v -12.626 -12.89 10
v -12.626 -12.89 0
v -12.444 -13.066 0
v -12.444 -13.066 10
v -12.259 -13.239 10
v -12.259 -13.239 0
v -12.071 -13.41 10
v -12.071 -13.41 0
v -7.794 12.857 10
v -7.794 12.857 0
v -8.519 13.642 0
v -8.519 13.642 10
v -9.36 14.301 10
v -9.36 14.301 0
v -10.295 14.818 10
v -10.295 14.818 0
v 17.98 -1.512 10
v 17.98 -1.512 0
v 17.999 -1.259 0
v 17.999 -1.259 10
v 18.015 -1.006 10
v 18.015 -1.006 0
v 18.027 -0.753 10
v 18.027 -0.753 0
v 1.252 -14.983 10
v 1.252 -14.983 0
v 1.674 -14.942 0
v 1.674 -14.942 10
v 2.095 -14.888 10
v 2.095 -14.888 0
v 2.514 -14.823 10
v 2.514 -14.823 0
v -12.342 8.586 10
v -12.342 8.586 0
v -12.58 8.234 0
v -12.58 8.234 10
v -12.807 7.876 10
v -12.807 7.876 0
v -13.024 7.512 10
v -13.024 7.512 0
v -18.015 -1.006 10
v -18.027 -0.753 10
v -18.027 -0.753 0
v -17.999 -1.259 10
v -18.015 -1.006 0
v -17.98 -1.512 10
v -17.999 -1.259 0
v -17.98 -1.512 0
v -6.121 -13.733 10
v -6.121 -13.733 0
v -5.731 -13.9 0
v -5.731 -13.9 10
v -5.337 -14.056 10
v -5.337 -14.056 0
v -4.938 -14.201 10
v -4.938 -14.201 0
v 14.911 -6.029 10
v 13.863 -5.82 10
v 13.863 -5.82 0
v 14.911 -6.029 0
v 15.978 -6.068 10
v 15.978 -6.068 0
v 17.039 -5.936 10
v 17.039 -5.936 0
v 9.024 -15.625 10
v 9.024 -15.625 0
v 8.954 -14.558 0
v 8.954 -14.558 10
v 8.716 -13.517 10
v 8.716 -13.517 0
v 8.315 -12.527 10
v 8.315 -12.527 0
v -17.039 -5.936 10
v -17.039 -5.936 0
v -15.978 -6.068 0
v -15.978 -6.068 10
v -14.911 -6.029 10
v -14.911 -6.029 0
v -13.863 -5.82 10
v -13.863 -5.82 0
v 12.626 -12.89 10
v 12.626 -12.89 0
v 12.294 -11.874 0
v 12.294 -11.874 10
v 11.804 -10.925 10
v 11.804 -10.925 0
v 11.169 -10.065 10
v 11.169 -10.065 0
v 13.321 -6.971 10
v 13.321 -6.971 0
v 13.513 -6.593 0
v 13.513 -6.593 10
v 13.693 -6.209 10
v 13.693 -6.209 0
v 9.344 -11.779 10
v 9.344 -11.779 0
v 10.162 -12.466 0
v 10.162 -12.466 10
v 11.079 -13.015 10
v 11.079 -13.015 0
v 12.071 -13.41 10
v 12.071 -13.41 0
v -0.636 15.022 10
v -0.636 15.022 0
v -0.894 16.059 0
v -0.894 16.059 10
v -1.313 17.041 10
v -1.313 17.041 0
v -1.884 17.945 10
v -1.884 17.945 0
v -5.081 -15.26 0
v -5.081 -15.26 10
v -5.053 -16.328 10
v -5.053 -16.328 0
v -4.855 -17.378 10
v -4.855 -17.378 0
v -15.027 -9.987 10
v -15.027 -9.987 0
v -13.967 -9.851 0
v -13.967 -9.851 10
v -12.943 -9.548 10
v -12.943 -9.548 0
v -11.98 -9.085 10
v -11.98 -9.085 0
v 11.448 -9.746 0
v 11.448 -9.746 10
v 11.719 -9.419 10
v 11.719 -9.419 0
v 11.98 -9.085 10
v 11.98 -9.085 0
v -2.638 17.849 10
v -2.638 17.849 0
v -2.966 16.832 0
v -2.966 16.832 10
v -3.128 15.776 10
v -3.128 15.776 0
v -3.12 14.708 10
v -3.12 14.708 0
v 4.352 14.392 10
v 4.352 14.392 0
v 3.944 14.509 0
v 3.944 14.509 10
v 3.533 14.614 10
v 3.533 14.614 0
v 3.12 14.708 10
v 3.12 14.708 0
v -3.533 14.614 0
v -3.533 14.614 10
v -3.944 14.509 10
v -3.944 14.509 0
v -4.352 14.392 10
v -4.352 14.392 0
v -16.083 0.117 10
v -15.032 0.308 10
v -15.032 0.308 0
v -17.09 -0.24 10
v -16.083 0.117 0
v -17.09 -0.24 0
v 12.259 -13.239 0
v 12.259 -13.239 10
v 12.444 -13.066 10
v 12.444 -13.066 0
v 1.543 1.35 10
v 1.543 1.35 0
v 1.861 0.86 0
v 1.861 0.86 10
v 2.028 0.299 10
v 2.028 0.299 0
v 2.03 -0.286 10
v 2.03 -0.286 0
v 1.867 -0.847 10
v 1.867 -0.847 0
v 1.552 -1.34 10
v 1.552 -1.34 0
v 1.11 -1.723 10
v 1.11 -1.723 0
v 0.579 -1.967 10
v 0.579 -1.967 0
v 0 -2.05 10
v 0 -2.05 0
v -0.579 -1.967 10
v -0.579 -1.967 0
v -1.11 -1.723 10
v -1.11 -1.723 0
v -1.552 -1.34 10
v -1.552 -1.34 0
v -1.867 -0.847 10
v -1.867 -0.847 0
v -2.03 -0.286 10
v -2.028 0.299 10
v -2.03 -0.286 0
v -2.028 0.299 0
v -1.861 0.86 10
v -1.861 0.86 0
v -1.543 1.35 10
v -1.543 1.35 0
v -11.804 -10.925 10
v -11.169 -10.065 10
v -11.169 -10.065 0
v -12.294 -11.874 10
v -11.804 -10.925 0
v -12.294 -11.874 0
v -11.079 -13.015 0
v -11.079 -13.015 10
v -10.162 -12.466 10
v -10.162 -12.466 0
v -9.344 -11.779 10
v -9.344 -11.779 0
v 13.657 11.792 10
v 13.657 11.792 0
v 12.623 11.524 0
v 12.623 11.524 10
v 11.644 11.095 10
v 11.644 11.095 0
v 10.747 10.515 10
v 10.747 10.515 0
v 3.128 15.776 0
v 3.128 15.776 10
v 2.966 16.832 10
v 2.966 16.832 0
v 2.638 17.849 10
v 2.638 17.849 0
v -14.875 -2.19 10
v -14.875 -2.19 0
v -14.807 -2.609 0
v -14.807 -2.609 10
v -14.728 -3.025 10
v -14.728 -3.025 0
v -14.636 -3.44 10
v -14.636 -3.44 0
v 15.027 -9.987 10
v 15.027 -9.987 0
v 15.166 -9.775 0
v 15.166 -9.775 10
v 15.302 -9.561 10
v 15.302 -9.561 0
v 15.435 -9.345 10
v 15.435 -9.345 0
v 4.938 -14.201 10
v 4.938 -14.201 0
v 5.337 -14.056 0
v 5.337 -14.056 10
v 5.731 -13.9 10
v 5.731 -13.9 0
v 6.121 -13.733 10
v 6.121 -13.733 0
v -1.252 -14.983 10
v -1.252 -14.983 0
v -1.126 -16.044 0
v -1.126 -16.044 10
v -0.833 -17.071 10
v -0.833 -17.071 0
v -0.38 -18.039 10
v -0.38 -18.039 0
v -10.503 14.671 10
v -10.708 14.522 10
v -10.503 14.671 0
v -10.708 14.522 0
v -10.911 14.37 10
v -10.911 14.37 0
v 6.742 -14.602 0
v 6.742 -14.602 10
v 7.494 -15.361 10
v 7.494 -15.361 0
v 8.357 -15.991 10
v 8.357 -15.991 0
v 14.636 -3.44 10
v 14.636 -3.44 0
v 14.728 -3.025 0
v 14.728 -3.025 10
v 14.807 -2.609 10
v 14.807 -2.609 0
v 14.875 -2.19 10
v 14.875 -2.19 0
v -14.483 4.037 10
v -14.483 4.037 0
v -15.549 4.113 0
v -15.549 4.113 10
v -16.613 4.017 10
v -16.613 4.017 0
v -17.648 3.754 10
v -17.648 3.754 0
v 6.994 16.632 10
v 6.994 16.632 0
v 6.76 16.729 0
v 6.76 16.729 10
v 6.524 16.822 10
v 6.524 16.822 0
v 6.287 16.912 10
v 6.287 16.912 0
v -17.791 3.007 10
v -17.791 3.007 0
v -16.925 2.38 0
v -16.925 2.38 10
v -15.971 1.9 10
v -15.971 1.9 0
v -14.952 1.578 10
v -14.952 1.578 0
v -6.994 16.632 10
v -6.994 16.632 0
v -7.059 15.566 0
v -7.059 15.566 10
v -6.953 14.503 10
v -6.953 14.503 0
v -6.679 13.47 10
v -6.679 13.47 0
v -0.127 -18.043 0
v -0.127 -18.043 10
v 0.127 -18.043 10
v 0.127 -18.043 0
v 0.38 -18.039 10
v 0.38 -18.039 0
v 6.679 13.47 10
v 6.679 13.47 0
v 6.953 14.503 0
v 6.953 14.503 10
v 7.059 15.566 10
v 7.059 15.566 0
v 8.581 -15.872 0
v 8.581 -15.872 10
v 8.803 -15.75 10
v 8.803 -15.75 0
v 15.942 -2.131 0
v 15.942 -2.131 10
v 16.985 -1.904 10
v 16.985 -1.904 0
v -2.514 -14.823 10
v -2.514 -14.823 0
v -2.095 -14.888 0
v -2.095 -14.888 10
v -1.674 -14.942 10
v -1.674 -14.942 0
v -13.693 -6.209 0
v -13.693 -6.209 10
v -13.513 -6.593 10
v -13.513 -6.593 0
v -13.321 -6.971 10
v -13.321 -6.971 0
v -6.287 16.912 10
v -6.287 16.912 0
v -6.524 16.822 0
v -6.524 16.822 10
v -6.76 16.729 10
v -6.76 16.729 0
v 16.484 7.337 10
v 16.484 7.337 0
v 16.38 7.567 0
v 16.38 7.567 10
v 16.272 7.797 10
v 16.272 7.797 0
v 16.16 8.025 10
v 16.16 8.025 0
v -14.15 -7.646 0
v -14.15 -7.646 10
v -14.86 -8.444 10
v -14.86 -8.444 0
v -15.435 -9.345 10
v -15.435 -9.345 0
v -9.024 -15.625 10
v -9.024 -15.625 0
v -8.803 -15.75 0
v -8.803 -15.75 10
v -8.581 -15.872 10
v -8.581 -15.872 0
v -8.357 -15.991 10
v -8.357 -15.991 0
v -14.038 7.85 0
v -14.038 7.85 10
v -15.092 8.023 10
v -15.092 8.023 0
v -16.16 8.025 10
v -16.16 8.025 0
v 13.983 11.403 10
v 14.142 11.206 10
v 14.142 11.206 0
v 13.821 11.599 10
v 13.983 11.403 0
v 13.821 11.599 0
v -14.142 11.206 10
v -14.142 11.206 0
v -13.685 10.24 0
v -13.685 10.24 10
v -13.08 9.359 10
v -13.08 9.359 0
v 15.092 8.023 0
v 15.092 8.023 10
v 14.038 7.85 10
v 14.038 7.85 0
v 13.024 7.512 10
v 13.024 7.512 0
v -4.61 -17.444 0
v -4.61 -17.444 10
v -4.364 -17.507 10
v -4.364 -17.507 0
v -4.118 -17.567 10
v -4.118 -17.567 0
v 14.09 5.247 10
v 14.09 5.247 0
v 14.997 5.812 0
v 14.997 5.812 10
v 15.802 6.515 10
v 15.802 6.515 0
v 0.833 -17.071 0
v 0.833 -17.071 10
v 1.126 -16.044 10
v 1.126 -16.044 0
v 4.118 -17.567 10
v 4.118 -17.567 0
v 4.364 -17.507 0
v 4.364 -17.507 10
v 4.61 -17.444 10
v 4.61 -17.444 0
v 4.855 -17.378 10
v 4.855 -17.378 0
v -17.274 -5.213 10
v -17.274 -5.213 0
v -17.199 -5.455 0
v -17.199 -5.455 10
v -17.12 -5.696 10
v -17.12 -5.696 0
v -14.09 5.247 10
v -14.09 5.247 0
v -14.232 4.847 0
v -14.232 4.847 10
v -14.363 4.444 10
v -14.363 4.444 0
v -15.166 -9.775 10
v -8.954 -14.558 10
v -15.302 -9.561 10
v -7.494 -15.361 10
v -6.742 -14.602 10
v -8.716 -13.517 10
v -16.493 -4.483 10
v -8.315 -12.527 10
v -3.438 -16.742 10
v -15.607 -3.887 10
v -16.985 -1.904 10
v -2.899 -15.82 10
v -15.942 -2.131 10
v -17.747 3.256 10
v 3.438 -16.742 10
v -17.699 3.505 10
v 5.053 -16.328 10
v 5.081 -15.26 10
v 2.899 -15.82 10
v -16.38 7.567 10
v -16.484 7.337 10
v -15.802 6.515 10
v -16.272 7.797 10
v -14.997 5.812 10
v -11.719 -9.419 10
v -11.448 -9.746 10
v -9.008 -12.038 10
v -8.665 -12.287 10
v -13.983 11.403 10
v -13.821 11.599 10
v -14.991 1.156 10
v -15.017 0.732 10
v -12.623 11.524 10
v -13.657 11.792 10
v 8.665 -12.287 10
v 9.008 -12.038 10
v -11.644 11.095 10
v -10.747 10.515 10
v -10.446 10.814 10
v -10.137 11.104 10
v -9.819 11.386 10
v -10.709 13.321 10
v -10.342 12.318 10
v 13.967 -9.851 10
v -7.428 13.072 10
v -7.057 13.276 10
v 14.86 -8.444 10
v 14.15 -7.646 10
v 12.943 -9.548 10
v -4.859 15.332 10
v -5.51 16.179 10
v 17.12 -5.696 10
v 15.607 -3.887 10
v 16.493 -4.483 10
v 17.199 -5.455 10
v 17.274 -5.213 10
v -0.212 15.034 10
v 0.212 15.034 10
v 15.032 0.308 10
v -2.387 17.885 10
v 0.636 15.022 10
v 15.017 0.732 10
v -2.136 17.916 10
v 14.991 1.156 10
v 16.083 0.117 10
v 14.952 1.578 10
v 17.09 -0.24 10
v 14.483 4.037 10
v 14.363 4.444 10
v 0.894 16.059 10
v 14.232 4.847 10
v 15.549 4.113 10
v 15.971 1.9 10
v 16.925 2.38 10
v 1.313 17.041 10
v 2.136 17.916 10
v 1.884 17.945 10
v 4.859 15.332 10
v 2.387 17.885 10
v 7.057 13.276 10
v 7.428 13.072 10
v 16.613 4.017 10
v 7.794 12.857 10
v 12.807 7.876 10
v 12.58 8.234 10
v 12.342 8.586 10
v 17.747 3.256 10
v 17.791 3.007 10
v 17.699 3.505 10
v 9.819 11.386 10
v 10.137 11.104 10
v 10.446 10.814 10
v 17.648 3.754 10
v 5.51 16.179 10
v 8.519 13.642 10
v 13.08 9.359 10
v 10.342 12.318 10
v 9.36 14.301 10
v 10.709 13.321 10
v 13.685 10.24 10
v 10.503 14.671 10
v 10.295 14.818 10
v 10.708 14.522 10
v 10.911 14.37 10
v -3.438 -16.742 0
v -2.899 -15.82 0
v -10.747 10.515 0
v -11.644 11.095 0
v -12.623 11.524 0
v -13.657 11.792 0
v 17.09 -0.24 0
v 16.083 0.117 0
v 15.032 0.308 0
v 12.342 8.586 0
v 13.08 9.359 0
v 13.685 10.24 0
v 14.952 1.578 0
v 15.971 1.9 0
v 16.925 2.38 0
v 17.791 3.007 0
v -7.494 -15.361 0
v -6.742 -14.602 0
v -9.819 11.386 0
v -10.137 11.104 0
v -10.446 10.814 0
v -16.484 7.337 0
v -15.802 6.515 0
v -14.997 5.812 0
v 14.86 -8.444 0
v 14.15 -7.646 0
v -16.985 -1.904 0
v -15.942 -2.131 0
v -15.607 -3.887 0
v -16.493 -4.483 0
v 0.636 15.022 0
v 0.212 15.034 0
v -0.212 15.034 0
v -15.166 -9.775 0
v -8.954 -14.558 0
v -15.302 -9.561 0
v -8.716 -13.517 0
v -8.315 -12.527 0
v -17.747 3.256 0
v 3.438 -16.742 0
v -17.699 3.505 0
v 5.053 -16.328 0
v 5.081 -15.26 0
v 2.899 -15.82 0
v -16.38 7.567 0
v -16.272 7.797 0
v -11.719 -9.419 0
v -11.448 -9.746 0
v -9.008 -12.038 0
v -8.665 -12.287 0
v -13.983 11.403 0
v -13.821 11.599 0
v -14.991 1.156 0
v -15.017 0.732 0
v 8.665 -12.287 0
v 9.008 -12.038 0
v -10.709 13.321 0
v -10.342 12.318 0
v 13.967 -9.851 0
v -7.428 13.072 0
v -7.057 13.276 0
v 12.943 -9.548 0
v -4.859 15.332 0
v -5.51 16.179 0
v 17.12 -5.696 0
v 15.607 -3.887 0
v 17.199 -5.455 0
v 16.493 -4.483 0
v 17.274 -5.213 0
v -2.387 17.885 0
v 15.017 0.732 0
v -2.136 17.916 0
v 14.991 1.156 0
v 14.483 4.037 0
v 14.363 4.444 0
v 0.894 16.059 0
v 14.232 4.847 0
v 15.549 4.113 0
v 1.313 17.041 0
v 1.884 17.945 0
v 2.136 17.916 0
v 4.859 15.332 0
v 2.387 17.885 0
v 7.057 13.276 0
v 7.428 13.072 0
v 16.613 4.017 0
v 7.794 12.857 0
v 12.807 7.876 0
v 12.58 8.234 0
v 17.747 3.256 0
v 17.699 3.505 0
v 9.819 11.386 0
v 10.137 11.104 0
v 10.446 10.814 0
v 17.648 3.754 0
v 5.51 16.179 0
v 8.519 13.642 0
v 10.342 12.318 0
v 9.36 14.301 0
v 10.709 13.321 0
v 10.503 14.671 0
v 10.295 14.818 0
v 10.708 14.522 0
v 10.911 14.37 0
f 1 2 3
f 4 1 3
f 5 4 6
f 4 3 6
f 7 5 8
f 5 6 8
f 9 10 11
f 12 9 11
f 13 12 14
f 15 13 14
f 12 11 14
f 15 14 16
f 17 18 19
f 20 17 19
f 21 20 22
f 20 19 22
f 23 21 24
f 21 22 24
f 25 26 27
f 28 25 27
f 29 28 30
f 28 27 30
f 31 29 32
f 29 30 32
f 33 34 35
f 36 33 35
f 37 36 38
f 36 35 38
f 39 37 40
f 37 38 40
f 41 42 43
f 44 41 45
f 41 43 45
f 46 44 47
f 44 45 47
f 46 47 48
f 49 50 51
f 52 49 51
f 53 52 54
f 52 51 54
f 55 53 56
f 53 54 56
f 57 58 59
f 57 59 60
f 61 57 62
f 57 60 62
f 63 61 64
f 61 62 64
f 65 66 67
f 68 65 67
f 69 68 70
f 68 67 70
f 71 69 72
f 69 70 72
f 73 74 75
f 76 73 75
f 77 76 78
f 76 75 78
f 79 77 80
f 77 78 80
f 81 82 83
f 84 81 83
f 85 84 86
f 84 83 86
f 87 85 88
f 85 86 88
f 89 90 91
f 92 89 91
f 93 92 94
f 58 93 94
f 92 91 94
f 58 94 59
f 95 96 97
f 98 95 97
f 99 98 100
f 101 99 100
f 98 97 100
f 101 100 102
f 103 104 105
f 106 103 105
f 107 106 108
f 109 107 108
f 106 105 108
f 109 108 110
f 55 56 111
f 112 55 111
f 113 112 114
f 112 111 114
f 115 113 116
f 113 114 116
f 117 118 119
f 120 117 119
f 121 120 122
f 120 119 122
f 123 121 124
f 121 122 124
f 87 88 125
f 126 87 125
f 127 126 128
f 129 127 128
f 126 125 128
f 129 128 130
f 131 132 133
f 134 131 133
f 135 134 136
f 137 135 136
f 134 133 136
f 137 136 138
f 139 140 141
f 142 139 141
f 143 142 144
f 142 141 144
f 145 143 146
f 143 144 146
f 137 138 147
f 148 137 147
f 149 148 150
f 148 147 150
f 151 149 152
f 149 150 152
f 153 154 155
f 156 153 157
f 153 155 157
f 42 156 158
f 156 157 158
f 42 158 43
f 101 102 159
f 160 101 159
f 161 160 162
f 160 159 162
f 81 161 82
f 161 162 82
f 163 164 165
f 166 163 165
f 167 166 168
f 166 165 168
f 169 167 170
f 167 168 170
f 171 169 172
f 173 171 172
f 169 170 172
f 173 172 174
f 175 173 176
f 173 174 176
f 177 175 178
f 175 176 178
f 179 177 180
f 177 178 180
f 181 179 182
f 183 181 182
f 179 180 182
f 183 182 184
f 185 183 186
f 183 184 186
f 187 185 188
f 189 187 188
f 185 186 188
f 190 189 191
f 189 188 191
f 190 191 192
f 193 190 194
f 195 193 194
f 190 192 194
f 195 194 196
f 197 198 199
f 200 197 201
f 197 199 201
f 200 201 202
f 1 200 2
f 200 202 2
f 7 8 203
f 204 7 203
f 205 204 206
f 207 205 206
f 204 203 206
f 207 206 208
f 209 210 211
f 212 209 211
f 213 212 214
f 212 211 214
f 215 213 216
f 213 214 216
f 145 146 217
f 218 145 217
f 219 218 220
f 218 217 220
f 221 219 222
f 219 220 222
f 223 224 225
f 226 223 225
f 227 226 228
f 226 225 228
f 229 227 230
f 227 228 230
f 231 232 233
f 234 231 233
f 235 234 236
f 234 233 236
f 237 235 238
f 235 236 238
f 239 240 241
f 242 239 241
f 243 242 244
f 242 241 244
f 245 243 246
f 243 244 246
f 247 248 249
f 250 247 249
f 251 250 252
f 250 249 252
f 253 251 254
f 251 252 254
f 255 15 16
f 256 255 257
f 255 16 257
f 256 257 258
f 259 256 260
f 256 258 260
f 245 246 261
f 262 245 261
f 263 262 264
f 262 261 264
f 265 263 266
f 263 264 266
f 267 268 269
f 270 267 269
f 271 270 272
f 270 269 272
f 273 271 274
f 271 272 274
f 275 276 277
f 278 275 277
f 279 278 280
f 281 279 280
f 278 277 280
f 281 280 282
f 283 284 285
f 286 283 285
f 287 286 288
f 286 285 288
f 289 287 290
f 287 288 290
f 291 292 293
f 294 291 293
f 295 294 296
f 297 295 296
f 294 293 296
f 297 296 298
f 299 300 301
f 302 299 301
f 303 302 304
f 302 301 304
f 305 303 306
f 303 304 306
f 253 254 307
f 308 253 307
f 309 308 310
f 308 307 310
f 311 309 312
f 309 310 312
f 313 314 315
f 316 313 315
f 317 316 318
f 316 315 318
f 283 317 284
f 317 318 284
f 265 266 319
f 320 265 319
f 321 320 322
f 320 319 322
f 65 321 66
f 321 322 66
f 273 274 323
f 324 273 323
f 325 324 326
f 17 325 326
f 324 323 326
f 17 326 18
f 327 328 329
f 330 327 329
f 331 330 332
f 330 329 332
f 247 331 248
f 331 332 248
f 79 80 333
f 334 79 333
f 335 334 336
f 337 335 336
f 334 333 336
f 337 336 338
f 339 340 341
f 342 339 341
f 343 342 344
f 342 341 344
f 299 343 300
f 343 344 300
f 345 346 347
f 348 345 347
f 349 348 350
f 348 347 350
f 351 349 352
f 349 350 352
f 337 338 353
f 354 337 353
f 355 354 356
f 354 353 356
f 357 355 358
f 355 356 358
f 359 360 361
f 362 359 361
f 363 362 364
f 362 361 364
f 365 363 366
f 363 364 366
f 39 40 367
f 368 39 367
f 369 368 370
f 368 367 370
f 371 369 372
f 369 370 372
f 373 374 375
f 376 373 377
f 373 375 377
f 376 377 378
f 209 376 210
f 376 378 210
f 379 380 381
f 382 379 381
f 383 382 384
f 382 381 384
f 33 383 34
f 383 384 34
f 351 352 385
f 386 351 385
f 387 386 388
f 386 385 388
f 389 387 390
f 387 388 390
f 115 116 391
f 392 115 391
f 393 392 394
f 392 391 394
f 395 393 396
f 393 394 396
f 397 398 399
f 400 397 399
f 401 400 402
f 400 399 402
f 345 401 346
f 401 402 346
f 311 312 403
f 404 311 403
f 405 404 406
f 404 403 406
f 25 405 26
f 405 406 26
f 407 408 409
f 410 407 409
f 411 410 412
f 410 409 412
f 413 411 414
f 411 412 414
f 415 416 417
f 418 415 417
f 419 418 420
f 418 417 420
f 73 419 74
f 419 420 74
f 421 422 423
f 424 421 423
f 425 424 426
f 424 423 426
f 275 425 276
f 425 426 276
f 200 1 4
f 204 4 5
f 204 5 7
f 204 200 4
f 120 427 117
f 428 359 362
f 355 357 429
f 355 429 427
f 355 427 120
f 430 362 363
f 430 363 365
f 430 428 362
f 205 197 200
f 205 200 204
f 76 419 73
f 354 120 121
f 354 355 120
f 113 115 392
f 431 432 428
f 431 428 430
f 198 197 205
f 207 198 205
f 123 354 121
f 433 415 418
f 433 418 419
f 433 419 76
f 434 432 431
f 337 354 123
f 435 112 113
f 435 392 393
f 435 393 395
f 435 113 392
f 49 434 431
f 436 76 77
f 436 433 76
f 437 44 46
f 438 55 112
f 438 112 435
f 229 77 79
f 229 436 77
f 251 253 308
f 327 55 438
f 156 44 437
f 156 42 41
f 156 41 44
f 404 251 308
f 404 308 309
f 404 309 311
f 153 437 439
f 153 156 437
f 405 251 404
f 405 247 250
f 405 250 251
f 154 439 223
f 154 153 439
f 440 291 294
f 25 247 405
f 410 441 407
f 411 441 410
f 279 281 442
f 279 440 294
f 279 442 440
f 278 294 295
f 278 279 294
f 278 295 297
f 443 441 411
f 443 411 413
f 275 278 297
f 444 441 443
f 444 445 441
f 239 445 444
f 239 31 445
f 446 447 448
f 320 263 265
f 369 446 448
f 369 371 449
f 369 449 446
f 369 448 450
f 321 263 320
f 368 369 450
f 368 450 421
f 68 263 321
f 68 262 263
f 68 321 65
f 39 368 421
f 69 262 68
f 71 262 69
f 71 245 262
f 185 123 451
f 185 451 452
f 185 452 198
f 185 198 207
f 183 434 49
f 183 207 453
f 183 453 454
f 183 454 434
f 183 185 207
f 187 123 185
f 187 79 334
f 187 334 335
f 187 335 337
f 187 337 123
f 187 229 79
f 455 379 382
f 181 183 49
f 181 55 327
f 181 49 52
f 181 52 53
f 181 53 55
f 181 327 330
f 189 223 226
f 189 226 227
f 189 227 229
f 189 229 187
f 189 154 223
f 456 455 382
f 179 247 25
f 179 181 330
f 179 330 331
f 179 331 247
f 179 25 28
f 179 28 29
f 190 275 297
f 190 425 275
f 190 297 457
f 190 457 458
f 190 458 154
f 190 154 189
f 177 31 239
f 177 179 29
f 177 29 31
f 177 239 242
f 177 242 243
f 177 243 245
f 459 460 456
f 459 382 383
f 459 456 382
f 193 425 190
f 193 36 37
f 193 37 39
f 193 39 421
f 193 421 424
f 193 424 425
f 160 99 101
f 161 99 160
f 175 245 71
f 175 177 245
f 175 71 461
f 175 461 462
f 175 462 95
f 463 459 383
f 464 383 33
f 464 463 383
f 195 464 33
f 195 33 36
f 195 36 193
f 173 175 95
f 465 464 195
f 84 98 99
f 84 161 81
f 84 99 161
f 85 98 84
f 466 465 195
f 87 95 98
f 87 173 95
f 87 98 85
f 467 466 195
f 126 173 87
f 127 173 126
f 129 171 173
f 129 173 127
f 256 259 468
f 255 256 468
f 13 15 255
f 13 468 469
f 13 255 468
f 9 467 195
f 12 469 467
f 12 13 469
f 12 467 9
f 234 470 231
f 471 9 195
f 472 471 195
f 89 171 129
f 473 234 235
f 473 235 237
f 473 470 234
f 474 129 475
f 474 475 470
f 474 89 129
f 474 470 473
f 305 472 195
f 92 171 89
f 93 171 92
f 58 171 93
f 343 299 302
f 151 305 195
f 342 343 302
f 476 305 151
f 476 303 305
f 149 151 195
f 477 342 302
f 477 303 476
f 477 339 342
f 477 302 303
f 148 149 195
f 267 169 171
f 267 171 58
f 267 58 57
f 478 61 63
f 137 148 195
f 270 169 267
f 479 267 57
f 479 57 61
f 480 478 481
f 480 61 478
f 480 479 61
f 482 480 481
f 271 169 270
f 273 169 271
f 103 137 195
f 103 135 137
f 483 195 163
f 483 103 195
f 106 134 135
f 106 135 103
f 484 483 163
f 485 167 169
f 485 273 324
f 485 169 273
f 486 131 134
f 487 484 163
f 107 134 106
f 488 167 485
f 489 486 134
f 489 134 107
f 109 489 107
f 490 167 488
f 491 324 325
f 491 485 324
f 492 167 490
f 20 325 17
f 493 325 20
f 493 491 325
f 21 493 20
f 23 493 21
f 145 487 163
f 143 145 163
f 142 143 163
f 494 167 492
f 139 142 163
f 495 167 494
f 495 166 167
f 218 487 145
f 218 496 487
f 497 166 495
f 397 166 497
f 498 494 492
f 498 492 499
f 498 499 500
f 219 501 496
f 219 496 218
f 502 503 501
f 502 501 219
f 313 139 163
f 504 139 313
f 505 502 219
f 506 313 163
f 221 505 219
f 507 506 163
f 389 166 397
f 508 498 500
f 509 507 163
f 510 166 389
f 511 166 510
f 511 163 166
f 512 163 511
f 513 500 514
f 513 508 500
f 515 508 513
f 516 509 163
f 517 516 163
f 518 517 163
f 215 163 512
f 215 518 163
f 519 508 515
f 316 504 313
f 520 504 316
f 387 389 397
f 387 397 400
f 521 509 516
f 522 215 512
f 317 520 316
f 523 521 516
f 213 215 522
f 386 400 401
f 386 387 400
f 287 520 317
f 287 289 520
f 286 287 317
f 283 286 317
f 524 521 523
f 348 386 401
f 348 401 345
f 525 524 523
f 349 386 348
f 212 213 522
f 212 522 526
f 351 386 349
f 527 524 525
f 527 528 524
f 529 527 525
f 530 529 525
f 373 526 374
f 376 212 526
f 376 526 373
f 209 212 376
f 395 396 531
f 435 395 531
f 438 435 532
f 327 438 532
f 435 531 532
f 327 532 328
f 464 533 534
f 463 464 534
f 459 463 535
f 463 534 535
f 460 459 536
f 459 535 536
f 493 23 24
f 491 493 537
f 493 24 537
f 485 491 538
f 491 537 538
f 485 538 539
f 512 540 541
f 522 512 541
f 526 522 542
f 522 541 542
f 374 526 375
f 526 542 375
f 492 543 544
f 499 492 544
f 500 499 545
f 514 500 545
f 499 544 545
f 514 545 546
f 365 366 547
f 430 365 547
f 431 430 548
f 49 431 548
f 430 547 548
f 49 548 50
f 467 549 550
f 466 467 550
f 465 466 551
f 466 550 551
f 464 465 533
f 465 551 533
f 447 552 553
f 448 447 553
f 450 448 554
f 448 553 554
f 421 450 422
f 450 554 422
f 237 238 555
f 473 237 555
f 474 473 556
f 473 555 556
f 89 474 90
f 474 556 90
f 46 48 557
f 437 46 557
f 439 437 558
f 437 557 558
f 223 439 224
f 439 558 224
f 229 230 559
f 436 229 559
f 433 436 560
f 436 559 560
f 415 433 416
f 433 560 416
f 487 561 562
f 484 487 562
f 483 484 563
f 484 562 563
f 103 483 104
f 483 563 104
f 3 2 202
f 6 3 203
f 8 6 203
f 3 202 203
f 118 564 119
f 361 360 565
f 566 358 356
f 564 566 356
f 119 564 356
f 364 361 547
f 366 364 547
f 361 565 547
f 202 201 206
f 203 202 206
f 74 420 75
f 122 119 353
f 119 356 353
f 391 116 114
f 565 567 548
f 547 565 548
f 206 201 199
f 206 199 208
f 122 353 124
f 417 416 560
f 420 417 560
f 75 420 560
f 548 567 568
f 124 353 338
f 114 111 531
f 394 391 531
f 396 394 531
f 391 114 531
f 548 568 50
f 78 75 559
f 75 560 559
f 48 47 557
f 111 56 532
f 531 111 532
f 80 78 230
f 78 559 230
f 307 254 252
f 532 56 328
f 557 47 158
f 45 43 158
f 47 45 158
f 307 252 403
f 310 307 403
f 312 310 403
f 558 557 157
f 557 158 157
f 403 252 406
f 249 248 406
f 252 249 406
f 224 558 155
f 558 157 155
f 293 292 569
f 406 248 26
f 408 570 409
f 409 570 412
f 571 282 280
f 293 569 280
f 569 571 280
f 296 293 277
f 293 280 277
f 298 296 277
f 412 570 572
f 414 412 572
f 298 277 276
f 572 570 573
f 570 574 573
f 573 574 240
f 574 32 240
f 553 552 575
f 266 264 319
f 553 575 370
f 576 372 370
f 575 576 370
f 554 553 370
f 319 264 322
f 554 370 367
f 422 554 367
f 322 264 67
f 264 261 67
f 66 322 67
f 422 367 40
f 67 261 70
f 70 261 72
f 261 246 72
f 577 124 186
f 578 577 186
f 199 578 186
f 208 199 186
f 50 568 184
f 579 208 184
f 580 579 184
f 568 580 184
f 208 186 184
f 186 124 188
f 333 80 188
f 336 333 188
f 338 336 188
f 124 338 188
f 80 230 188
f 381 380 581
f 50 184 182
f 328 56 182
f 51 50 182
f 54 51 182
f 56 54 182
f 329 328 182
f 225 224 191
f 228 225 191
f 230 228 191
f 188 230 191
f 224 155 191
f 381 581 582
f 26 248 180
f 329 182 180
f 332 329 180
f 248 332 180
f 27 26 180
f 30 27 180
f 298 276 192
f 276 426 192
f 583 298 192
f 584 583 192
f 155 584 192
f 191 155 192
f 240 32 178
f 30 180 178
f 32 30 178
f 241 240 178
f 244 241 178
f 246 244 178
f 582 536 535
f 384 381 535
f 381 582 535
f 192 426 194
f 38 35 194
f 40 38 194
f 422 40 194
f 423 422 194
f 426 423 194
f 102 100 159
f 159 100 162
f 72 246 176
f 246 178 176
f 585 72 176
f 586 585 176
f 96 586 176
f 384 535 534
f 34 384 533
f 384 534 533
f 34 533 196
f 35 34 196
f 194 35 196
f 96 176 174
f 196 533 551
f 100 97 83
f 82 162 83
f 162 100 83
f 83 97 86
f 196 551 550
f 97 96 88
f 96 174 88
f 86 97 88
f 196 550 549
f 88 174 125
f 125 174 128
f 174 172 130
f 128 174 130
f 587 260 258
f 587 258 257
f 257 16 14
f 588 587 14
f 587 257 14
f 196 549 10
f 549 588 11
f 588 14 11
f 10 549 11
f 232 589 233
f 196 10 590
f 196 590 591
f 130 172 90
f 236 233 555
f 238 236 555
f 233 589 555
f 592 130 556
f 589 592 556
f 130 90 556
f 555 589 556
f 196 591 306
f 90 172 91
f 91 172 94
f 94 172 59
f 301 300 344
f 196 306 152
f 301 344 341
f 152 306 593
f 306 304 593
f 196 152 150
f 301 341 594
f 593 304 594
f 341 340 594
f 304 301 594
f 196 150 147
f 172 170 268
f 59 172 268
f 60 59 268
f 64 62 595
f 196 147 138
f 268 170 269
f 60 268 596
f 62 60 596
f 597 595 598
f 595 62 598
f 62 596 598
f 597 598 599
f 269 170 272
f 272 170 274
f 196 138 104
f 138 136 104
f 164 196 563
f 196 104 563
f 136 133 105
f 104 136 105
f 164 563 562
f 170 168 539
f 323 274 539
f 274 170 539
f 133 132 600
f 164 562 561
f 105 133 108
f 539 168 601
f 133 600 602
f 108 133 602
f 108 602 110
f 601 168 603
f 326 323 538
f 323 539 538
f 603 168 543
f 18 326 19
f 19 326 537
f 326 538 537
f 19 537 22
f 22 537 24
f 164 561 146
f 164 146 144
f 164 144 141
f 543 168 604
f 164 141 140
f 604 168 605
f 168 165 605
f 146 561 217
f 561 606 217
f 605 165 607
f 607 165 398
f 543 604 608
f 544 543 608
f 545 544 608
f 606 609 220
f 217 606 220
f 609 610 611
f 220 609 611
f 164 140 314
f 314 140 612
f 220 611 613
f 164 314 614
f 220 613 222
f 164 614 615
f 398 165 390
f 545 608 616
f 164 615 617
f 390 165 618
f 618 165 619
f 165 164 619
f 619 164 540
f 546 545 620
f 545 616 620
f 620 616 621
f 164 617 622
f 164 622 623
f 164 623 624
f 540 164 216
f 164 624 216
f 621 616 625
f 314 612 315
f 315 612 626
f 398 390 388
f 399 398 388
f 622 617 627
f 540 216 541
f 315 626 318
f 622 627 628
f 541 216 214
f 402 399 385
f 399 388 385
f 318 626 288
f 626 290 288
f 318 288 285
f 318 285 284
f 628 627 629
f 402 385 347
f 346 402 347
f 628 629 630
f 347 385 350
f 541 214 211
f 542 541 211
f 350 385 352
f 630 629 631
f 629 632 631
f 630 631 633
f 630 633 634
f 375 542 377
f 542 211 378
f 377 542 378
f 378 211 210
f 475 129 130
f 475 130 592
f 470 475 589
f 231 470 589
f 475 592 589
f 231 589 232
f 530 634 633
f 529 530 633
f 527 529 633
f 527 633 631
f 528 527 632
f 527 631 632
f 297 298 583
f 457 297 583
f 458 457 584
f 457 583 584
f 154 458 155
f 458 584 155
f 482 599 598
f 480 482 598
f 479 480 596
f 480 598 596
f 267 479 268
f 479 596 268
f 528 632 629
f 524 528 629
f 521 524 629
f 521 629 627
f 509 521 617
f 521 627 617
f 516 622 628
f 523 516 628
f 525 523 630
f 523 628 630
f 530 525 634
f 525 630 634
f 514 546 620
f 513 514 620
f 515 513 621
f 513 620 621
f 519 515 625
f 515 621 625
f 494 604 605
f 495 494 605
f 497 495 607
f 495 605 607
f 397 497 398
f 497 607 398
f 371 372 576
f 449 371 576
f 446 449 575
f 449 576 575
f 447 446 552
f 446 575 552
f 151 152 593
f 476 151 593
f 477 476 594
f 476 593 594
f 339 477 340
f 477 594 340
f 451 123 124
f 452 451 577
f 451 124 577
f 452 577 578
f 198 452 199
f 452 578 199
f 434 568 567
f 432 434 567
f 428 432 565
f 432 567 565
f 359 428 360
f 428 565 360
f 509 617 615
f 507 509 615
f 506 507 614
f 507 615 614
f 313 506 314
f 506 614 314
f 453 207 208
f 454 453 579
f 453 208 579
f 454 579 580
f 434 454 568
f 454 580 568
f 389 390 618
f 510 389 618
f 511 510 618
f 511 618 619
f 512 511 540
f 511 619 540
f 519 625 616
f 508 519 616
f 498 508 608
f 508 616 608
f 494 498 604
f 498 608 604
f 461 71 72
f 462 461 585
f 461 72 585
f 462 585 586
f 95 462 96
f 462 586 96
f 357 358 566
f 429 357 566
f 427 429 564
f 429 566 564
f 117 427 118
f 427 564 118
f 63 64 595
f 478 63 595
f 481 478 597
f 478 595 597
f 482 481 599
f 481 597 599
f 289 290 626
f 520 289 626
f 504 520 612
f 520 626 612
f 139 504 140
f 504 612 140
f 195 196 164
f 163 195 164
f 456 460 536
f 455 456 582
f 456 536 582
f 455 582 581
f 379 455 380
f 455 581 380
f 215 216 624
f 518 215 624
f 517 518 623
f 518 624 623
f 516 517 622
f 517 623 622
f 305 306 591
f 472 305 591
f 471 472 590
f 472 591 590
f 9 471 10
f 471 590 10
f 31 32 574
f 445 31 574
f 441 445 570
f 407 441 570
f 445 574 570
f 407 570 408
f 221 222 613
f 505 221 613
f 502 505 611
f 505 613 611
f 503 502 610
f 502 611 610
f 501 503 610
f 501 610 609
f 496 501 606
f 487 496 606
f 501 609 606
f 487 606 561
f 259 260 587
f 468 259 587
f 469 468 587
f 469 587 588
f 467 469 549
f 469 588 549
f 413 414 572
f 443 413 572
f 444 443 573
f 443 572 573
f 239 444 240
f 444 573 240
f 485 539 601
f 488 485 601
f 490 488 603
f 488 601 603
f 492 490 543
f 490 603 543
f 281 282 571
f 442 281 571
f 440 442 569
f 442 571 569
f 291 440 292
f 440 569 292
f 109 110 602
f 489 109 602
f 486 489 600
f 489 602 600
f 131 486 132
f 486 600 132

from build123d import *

# Parameters (mm, degrees)
BOSS_EXTRUDE1_DEPTH = 10


with BuildPart() as part:
    # Sketch1 → Boss-Extrude1 (new body)
    with BuildSketch(Plane.XY):
        with BuildLine():
            ThreePointArc((6.994301009, 16.632383564), (6.642138435, 16.776126687), (6.287024027, 16.912414331))
            ThreePointArc((6.287024027, 16.912414331), (5.167401268, 15.768670982), (4.351852136, 14.391505929))
            ThreePointArc((4.351852136, 14.391505929), (3.739075899, 14.562739143), (3.11960376, 14.707893537))
            ThreePointArc((3.11960376, 14.707893537), (3.068386931, 16.307606264), (2.63825659, 17.849258578))
            ThreePointArc((2.63825659, 17.849258578), (2.261410389, 17.900906476), (1.883559194, 17.944599031))
            ThreePointArc((1.883559194, 17.944599031), (1.083548848, 16.558349625), (0.636108713, 15.021631923))
            ThreePointArc((0.636108713, 15.021631923), (0, 15.035094277), (-0.636108713, 15.021631923))
            ThreePointArc((-0.636108713, 15.021631923), (-1.083548848, 16.558349625), (-1.883559194, 17.944599031))
            ThreePointArc((-1.883559194, 17.944599031), (-2.261410389, 17.900906476), (-2.63825659, 17.849258578))
            ThreePointArc((-2.63825659, 17.849258578), (-3.068386931, 16.307606264), (-3.11960376, 14.707893537))
            ThreePointArc((-3.11960376, 14.707893537), (-3.739075899, 14.562739143), (-4.351852136, 14.391505929))
            ThreePointArc((-4.351852136, 14.391505929), (-5.167401268, 15.768670982), (-6.287024027, 16.912414331))
            ThreePointArc((-6.287024027, 16.912414331), (-6.642138435, 16.776126687), (-6.994301009, 16.632383564))
            ThreePointArc((-6.994301009, 16.632383564), (-7.027524675, 15.032196025), (-6.679300055, 13.470004109))
            ThreePointArc((-6.679300055, 13.470004109), (-7.243211909, 13.17535355), (-7.794152684, 12.85710869))
            ThreePointArc((-7.794152684, 12.85710869), (-8.926566862, 13.988188748), (-10.295452017, 14.817560439))
            ThreePointArc((-10.295452017, 14.817560439), (-10.605516495, 14.597241161), (-10.910867773, 14.37043472))
            ThreePointArc((-10.910867773, 14.37043472), (-10.545097198, 12.812257626), (-9.819311364, 11.385744783))
            ThreePointArc((-9.819311364, 11.385744783), (-10.292230275, 10.960112038), (-10.746717955, 10.514852026))
            ThreePointArc((-10.746717955, 10.514852026), (-12.124843431, 11.32877717), (-13.656978894, 11.79166473))
            ThreePointArc((-13.656978894, 11.79166473), (-13.902510949, 11.501157287), (-14.141864588, 11.205538613))
            ThreePointArc((-14.141864588, 11.205538613), (-13.400082482, 9.787277961), (-12.342339226, 8.586077239))
            ThreePointArc((-12.342339226, 8.586077239), (-12.694549961, 8.056206379), (-13.024027412, 7.511908539))
            ThreePointArc((-13.024027412, 7.511908539), (-14.561271495, 7.957536859), (-16.16038756, 8.024855359))
            ThreePointArc((-16.16038756, 8.024855359), (-16.32595951, 7.682413402), (-16.48427604, 7.336557303))
            ThreePointArc((-16.48427604, 7.336557303), (-15.413091302, 6.147327625), (-14.089852523, 5.246914884))
            ThreePointArc((-14.089852523, 5.246914884), (-14.299224386, 4.646099644), (-14.482989328, 4.036964211))
            ThreePointArc((-14.482989328, 4.036964211), (-16.082761318, 4.08629524), (-17.648379642, 3.753814812))
            ThreePointArc((-17.648379642, 3.753814812), (-17.723587993, 3.38095523), (-17.790919803, 3.006593116))
            ThreePointArc((-17.790919803, 3.006593116), (-16.457638909, 2.121118087), (-14.952048567, 1.57806957))
            ThreePointArc((-14.952048567, 1.57806957), (-15.005425953, 0.944061381), (-15.03193176, 0.308362575))
            ThreePointArc((-15.03193176, 0.308362575), (-16.593712099, -0.041703336), (-18.027459124, -0.753091724))
            ThreePointArc((-18.027459124, -0.753091724), (-18.00757826, -1.132940794), (-17.979694645, -1.512286374))
            ThreePointArc((-17.979694645, -1.512286374), (-16.468092537, -2.038369101), (-14.87475241, -2.189931658))
            ThreePointArc((-14.87475241, -2.189931658), (-14.768781422, -2.817295731), (-14.636362636, -3.439614616))
            ThreePointArc((-14.636362636, -3.439614616), (-16.062018922, -4.167081539), (-17.27380705, -5.212678738))
            ThreePointArc((-17.27380705, -5.212678738), (-17.160086157, -5.575649981), (-17.038739148, -5.936143349))
            ThreePointArc((-17.038739148, -5.936143349), (-15.443795346, -6.069778062), (-13.862820853, -5.820331426))
            ThreePointArc((-13.862820853, -5.820331426), (-13.604160038, -6.40163179), (-13.321137019, -6.97146817))
            ThreePointArc((-13.321137019, -6.97146817), (-14.521090024, -8.030626683), (-15.43477815, -9.344733977))
            ThreePointArc((-15.43477815, -9.344733977), (-15.23436273, -9.668020574), (-15.027177006, -9.987010606))
            ThreePointArc((-15.027177006, -9.987010606), (-13.449107694, -9.719800545), (-11.979837279, -9.085018366))
            ThreePointArc((-11.979837279, -9.085018366), (-11.584739247, -9.58372978), (-11.168895371, -10.06527874))
            ThreePointArc((-11.168895371, -10.06527874), (-12.067747635, -11.389578018), (-12.625925373, -12.889625211))
            ThreePointArc((-12.625925373, -12.889625211), (-12.351408265, -13.152913878), (-12.071402067, -13.410357257))
            ThreePointArc((-12.071402067, -13.410357257), (-10.609363144, -12.759092212), (-9.344116469, -11.778860189))
            ThreePointArc((-9.344116469, -11.778860189), (-8.837406683, -12.163646782), (-8.314870951, -12.526650829))
            ThreePointArc((-8.314870951, -12.526650829), (-8.85614428, -14.032880278), (-9.023739271, -15.624613889))
            ThreePointArc((-9.023739271, -15.624613889), (-8.692369394, -15.81136123), (-8.35713654, -15.991081842))
            ThreePointArc((-8.35713654, -15.991081842), (-7.102993289, -14.996683191), (-6.121270456, -13.732592906))
            ThreePointArc((-6.121270456, -13.732592906), (-5.534787355, -13.979277122), (-4.938392608, -14.200927377))
            ThreePointArc((-4.938392608, -14.200927377), (-5.088076809, -15.794445061), (-4.854558443, -17.377850613))
            ThreePointArc((-4.854558443, -17.377850613), (-4.487156985, -17.476322606), (-4.117761389, -17.567027943))
            ThreePointArc((-4.117761389, -17.567027943), (-3.150316243, -16.291977412), (-2.513802508, -14.823456307))
            ThreePointArc((-2.513802508, -14.823456307), (-1.884396983, -14.916538068), (-1.251616896, -14.982907431))
            ThreePointArc((-1.251616896, -14.982907431), (-1.000306759, -16.563586773), (-0.380347854, -18.039173072))
            ThreePointArc((-0.380347854, -18.039173072), (0, -18.043182358), (0.380347854, -18.039173072))
            ThreePointArc((0.380347854, -18.039173072), (1.000306759, -16.563586773), (1.251616896, -14.982907431))
            ThreePointArc((1.251616896, -14.982907431), (1.884396983, -14.916538068), (2.513802508, -14.823456307))
            ThreePointArc((2.513802508, -14.823456307), (3.150316243, -16.291977412), (4.117761389, -17.567027943))
            ThreePointArc((4.117761389, -17.567027943), (4.487156985, -17.476322606), (4.854558443, -17.377850613))
            ThreePointArc((4.854558443, -17.377850613), (5.088076809, -15.794445061), (4.938392608, -14.200927377))
            ThreePointArc((4.938392608, -14.200927377), (5.534787355, -13.979277122), (6.121270456, -13.732592906))
            ThreePointArc((6.121270456, -13.732592906), (7.102993289, -14.996683191), (8.35713654, -15.991081842))
            ThreePointArc((8.35713654, -15.991081842), (8.692369394, -15.81136123), (9.023739271, -15.624613889))
            ThreePointArc((9.023739271, -15.624613889), (8.85614428, -14.032880278), (8.314870951, -12.526650829))
            ThreePointArc((8.314870951, -12.526650829), (8.837406683, -12.163646782), (9.344116469, -11.778860189))
            ThreePointArc((9.344116469, -11.778860189), (10.609363144, -12.759092212), (12.071402067, -13.410357257))
            ThreePointArc((12.071402067, -13.410357257), (12.351408265, -13.152913878), (12.625925373, -12.889625211))
            ThreePointArc((12.625925373, -12.889625211), (12.067747635, -11.389578018), (11.168895371, -10.06527874))
            ThreePointArc((11.168895371, -10.06527874), (11.584739247, -9.58372978), (11.979837279, -9.085018366))
            ThreePointArc((11.979837279, -9.085018366), (13.449107694, -9.719800545), (15.027177006, -9.987010606))
            ThreePointArc((15.027177006, -9.987010606), (15.23436273, -9.668020574), (15.43477815, -9.344733977))
            ThreePointArc((15.43477815, -9.344733977), (14.521090024, -8.030626683), (13.321137019, -6.97146817))
            ThreePointArc((13.321137019, -6.97146817), (13.604160038, -6.40163179), (13.862820853, -5.820331426))
            ThreePointArc((13.862820853, -5.820331426), (15.443795346, -6.069778062), (17.038739148, -5.936143349))
            ThreePointArc((17.038739148, -5.936143349), (17.160086157, -5.575649981), (17.27380705, -5.212678738))
            ThreePointArc((17.27380705, -5.212678738), (16.062018922, -4.167081539), (14.636362636, -3.439614616))
            ThreePointArc((14.636362636, -3.439614616), (14.768781422, -2.817295731), (14.87475241, -2.189931658))
            ThreePointArc((14.87475241, -2.189931658), (16.468092537, -2.038369101), (17.979694645, -1.512286374))
            ThreePointArc((17.979694645, -1.512286374), (18.00757826, -1.132940794), (18.027459124, -0.753091724))
            ThreePointArc((18.027459124, -0.753091724), (16.593712099, -0.041703336), (15.03193176, 0.308362575))
            ThreePointArc((15.03193176, 0.308362575), (15.005425953, 0.944061381), (14.952048567, 1.57806957))
            ThreePointArc((14.952048567, 1.57806957), (16.457638909, 2.121118087), (17.790919803, 3.006593116))
            ThreePointArc((17.790919803, 3.006593116), (17.723587993, 3.38095523), (17.648379642, 3.753814812))
            ThreePointArc((17.648379642, 3.753814812), (16.082761318, 4.08629524), (14.482989328, 4.036964211))
            ThreePointArc((14.482989328, 4.036964211), (14.299224386, 4.646099644), (14.089852523, 5.246914884))
            ThreePointArc((14.089852523, 5.246914884), (15.413091302, 6.147327625), (16.48427604, 7.336557303))
            ThreePointArc((16.48427604, 7.336557303), (16.32595951, 7.682413402), (16.16038756, 8.024855359))
            ThreePointArc((16.16038756, 8.024855359), (14.561271495, 7.957536859), (13.024027412, 7.511908539))
            ThreePointArc((13.024027412, 7.511908539), (12.694549961, 8.056206379), (12.342339226, 8.586077239))
            ThreePointArc((12.342339226, 8.586077239), (13.400082482, 9.787277961), (14.141864588, 11.205538613))
            ThreePointArc((14.141864588, 11.205538613), (13.902510949, 11.501157287), (13.656978894, 11.79166473))
            ThreePointArc((13.656978894, 11.79166473), (12.124843431, 11.32877717), (10.746717955, 10.514852026))
            ThreePointArc((10.746717955, 10.514852026), (10.292230275, 10.960112038), (9.819311364, 11.385744783))
            ThreePointArc((9.819311364, 11.385744783), (10.545097198, 12.812257626), (10.910867773, 14.37043472))
            ThreePointArc((10.910867773, 14.37043472), (10.605516495, 14.597241161), (10.295452017, 14.817560439))
            ThreePointArc((10.295452017, 14.817560439), (8.926566862, 13.988188748), (7.794152684, 12.85710869))
            ThreePointArc((7.794152684, 12.85710869), (7.243211909, 13.17535355), (6.679300055, 13.470004109))
            ThreePointArc((6.679300055, 13.470004109), (7.027524675, 15.032196025), (6.994301009, 16.632383564))
        make_face()
        with BuildLine():
            Line((-1.542724862, 1.35), (1.542724862, 1.35))
            ThreePointArc((1.542724862, 1.35), (0, -2.05), (-1.542724862, 1.35))
        make_face(mode=Mode.SUBTRACT)
    extrude(amount=BOSS_EXTRUDE1_DEPTH)


solid = part.part
